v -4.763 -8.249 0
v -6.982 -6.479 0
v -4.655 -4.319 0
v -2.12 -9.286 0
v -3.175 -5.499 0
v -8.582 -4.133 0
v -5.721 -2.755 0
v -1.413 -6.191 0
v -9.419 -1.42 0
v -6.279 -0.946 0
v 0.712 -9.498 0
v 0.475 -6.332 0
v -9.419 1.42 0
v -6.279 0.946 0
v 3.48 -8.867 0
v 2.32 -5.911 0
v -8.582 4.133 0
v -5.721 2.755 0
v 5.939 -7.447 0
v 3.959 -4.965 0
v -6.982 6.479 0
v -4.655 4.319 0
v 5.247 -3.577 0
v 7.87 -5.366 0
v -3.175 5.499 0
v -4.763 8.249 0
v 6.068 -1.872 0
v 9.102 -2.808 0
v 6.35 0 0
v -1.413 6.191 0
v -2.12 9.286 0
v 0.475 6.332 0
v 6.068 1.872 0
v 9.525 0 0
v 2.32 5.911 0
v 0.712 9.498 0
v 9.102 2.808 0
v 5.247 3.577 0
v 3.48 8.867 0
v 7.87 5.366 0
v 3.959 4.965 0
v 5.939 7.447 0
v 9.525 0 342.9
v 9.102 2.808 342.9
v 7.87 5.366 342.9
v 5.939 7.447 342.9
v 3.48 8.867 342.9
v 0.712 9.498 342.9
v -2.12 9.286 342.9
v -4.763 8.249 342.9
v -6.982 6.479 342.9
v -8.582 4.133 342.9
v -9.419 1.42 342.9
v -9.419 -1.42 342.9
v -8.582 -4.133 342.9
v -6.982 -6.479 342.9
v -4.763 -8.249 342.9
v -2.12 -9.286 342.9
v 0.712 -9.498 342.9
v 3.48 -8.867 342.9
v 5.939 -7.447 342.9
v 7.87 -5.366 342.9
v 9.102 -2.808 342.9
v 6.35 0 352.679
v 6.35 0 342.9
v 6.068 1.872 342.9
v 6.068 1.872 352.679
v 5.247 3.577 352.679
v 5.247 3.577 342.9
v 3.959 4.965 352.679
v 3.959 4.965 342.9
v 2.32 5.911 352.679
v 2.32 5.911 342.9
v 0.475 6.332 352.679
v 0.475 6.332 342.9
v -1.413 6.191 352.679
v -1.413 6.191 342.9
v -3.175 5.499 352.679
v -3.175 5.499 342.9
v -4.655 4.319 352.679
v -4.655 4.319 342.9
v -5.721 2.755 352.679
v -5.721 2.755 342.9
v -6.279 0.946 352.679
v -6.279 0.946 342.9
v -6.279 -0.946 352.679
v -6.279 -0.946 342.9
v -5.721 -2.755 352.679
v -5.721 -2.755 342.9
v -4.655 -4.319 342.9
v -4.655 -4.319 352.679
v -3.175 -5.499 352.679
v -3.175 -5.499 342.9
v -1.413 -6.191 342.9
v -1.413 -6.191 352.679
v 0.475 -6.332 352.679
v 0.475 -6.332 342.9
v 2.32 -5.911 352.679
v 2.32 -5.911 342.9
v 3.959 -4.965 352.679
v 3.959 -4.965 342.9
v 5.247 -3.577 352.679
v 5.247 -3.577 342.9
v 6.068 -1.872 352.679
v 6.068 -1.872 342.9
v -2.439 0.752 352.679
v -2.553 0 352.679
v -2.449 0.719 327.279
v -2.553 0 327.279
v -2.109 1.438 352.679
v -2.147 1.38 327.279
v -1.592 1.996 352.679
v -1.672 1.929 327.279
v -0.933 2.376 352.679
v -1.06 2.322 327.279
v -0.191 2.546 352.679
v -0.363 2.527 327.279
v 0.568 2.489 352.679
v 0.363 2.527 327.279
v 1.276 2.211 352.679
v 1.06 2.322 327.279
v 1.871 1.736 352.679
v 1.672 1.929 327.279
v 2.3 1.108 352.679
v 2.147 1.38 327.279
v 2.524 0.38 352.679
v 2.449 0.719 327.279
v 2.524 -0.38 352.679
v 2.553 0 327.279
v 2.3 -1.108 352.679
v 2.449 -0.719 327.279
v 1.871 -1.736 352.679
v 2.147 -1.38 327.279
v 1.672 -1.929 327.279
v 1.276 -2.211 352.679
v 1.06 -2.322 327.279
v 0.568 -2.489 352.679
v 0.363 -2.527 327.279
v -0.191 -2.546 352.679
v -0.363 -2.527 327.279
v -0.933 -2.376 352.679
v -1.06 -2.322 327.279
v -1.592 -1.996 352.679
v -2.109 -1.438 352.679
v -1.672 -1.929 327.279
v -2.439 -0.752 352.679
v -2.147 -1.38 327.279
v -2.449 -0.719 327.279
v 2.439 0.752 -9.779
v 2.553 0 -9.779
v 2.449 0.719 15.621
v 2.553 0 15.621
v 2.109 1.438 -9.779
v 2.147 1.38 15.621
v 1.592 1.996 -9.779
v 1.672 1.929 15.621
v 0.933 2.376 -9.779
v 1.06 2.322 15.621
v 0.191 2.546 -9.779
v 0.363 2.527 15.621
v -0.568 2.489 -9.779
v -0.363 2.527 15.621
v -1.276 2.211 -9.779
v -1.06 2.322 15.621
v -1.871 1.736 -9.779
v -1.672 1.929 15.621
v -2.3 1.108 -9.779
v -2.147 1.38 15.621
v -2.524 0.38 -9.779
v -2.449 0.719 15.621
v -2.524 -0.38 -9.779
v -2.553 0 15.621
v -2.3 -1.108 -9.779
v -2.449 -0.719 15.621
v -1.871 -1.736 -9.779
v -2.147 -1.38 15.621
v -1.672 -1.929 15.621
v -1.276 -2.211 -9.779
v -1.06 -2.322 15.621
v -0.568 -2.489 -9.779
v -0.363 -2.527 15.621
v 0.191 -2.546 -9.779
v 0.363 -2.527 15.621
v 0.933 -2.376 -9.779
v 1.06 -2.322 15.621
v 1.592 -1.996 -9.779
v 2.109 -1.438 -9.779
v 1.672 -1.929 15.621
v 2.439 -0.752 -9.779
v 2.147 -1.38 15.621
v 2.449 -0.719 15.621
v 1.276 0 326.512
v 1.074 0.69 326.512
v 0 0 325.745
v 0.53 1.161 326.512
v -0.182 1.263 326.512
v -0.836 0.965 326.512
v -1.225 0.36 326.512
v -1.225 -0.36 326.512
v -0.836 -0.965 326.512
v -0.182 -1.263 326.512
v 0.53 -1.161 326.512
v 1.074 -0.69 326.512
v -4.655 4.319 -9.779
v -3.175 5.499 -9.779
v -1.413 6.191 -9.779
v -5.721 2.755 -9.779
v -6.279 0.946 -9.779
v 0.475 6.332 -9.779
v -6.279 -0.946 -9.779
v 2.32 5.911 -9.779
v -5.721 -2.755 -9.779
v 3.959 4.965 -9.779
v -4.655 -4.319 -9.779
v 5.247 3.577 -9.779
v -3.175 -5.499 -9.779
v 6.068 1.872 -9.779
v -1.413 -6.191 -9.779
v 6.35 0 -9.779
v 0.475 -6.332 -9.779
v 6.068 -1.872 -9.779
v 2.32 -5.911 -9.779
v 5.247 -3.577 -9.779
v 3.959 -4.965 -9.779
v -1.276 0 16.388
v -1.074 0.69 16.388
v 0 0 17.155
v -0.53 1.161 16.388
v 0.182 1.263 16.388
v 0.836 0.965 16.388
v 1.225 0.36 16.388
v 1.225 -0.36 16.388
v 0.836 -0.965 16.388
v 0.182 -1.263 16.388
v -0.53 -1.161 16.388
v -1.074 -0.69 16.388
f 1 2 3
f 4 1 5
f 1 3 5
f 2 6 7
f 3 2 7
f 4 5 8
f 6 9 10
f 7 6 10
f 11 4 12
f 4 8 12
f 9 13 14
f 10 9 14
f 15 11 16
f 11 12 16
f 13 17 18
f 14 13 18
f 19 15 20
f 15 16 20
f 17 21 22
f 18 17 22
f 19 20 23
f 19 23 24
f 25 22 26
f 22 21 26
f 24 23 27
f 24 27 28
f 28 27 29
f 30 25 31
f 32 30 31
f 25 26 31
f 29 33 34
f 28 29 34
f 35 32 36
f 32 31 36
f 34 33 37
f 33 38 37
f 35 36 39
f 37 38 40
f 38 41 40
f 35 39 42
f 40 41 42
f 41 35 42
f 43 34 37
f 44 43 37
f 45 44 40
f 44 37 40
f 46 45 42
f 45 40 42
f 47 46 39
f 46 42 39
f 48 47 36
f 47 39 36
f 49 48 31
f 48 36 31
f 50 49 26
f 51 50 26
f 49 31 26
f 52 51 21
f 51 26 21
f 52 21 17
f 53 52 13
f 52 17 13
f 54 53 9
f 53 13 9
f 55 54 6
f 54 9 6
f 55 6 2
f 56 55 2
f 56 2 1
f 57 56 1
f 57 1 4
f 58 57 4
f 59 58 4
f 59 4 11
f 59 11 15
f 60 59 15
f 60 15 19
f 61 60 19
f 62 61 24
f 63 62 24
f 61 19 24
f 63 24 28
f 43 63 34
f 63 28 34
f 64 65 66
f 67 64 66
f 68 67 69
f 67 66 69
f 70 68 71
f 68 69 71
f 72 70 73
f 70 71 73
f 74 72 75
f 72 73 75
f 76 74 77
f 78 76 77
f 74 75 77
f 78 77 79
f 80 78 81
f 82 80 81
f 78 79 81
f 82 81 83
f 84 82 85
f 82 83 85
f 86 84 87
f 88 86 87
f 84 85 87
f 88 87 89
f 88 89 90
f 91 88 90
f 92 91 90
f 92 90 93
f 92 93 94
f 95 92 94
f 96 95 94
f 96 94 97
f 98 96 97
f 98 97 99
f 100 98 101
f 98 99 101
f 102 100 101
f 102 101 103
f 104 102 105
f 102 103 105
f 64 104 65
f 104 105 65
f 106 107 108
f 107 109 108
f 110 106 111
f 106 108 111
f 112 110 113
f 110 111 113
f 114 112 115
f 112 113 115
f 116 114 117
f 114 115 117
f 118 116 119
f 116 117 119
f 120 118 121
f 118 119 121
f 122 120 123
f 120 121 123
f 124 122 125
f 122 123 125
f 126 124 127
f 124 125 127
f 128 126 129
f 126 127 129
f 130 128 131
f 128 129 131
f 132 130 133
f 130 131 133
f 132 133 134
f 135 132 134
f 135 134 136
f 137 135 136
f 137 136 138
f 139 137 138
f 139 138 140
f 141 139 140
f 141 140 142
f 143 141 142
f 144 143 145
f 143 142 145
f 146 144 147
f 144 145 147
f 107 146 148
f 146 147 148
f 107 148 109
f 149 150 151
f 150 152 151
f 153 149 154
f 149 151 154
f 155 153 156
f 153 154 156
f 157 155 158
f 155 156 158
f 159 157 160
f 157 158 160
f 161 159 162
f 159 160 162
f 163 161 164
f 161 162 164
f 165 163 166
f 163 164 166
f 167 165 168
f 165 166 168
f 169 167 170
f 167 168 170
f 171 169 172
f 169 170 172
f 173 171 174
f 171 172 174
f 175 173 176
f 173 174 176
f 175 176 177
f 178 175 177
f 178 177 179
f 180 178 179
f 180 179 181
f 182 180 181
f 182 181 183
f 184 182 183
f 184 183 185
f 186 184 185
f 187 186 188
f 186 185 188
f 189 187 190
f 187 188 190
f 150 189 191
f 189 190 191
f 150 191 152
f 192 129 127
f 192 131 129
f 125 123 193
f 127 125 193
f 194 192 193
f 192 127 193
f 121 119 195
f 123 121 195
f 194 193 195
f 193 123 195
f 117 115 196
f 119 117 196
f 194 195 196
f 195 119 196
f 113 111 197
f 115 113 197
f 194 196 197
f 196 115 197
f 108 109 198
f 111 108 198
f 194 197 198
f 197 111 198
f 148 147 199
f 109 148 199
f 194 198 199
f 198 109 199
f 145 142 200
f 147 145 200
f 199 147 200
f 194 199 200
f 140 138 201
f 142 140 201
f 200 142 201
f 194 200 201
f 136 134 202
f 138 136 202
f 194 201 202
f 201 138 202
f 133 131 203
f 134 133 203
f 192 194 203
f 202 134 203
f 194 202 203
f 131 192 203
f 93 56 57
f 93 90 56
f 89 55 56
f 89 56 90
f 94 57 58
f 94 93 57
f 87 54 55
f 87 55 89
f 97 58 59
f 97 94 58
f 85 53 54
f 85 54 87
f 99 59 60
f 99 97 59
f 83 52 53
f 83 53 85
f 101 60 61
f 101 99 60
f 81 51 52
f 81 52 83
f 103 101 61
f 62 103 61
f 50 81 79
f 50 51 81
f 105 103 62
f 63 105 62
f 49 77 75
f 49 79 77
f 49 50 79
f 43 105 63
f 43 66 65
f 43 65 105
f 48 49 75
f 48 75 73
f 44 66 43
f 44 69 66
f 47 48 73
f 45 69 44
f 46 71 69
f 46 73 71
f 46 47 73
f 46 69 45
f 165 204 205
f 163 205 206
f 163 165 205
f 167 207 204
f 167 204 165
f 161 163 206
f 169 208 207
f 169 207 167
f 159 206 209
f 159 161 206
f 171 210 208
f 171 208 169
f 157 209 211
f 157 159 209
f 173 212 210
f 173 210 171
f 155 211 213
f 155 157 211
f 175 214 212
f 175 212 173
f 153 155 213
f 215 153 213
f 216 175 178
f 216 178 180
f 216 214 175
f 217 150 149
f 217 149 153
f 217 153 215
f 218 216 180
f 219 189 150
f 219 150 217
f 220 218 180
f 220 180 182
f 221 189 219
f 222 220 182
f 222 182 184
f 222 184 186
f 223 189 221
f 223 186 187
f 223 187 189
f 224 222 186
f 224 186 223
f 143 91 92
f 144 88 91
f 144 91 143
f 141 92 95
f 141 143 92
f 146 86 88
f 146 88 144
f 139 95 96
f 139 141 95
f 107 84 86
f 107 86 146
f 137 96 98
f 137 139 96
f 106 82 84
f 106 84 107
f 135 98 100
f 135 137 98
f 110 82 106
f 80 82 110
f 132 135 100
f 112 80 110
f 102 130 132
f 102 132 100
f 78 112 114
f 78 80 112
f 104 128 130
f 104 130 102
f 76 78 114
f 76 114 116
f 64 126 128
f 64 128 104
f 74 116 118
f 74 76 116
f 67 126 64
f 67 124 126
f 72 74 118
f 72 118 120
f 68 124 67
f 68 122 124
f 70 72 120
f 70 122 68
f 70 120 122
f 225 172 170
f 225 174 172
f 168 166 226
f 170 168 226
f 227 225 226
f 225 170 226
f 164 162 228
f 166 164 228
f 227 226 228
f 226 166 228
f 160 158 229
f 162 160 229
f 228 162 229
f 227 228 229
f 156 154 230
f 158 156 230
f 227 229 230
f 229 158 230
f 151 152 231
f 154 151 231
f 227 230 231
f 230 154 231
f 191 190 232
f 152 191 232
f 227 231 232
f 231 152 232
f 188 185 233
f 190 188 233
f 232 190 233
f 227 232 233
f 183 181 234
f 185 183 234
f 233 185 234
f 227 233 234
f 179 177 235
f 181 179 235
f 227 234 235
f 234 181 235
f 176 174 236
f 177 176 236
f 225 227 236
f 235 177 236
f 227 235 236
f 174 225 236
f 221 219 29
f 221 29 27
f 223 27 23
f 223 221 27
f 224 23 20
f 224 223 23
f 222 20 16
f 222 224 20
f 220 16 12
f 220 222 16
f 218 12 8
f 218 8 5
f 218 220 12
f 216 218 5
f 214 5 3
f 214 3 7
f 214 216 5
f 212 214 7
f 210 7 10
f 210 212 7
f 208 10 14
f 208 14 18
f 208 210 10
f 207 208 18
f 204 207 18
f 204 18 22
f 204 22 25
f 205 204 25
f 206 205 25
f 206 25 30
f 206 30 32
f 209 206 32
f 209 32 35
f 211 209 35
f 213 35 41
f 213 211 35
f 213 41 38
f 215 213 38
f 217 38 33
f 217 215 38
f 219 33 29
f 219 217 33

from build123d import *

# Parameters (mm, degrees)
SKETCH1_R                   = 9.525
BOSS_EXTRUDE1_DEPTH         = 342.9
SKETCH2_R                   = 6.35
BOSS_EXTRUDE2_DEPTH         = 9.779
F_1_4_20_TAPPED_HOLE1_D     = 5.1054
F_1_4_20_TAPPED_HOLE1_DEPTH = 25.4
F_1_4_20_TAPPED_HOLE1_TIP   = 1.533816902
BOSS_EXTRUDE3_START         = 9.779
SKETCH5_R                   = 6.35
BOSS_EXTRUDE3_DEPTH         = 9.779
F_1_4_20_TAPPED_HOLE2_D     = 5.1054
F_1_4_20_TAPPED_HOLE2_DEPTH = 25.4
F_1_4_20_TAPPED_HOLE2_TIP   = 1.533816902


with BuildPart() as part:
    # Sketch1 → Boss-Extrude1 (new body)
    with BuildSketch(Plane.XY):
        Circle(SKETCH1_R)
    extrude(amount=BOSS_EXTRUDE1_DEPTH)

    # Sketch2 → Boss-Extrude2 (add)
    with BuildSketch(Plane.XY.offset(342.9)):
        Circle(SKETCH2_R)
    extrude(amount=BOSS_EXTRUDE2_DEPTH)

    # 1/4-20 Tapped Hole1
    with Locations(Plane.XY.offset(352.679)):
        with Locations((0, 0)):
            Hole(F_1_4_20_TAPPED_HOLE1_D / 2, depth=F_1_4_20_TAPPED_HOLE1_DEPTH)
            with Locations((0, 0, -(F_1_4_20_TAPPED_HOLE1_DEPTH + F_1_4_20_TAPPED_HOLE1_TIP / 2))):  # 118° drill point
                Cone(0, F_1_4_20_TAPPED_HOLE1_D / 2, F_1_4_20_TAPPED_HOLE1_TIP, mode=Mode.SUBTRACT)

    # Sketch5 → Boss-Extrude3 (add)
    with BuildSketch(Plane(origin=(0, 0, 0), x_dir=(-1, 0, 0), z_dir=(0, 0, -1)).offset(BOSS_EXTRUDE3_START)):
        with Locations(Location((0, 0, 0), (0, 0, 180))):
            Circle(SKETCH5_R)
    extrude(amount=-BOSS_EXTRUDE3_DEPTH)

    # 1/4-20 Tapped Hole2
    with Locations(Plane(origin=(0, 0, -9.779), x_dir=(-1, 0, 0), z_dir=(0, 0, -1))):
        with Locations((0, 0)):
            Hole(F_1_4_20_TAPPED_HOLE2_D / 2, depth=F_1_4_20_TAPPED_HOLE2_DEPTH)
            with Locations((0, 0, -(F_1_4_20_TAPPED_HOLE2_DEPTH + F_1_4_20_TAPPED_HOLE2_TIP / 2))):  # 118° drill point
                Cone(0, F_1_4_20_TAPPED_HOLE2_D / 2, F_1_4_20_TAPPED_HOLE2_TIP, mode=Mode.SUBTRACT)


solid = part.part
